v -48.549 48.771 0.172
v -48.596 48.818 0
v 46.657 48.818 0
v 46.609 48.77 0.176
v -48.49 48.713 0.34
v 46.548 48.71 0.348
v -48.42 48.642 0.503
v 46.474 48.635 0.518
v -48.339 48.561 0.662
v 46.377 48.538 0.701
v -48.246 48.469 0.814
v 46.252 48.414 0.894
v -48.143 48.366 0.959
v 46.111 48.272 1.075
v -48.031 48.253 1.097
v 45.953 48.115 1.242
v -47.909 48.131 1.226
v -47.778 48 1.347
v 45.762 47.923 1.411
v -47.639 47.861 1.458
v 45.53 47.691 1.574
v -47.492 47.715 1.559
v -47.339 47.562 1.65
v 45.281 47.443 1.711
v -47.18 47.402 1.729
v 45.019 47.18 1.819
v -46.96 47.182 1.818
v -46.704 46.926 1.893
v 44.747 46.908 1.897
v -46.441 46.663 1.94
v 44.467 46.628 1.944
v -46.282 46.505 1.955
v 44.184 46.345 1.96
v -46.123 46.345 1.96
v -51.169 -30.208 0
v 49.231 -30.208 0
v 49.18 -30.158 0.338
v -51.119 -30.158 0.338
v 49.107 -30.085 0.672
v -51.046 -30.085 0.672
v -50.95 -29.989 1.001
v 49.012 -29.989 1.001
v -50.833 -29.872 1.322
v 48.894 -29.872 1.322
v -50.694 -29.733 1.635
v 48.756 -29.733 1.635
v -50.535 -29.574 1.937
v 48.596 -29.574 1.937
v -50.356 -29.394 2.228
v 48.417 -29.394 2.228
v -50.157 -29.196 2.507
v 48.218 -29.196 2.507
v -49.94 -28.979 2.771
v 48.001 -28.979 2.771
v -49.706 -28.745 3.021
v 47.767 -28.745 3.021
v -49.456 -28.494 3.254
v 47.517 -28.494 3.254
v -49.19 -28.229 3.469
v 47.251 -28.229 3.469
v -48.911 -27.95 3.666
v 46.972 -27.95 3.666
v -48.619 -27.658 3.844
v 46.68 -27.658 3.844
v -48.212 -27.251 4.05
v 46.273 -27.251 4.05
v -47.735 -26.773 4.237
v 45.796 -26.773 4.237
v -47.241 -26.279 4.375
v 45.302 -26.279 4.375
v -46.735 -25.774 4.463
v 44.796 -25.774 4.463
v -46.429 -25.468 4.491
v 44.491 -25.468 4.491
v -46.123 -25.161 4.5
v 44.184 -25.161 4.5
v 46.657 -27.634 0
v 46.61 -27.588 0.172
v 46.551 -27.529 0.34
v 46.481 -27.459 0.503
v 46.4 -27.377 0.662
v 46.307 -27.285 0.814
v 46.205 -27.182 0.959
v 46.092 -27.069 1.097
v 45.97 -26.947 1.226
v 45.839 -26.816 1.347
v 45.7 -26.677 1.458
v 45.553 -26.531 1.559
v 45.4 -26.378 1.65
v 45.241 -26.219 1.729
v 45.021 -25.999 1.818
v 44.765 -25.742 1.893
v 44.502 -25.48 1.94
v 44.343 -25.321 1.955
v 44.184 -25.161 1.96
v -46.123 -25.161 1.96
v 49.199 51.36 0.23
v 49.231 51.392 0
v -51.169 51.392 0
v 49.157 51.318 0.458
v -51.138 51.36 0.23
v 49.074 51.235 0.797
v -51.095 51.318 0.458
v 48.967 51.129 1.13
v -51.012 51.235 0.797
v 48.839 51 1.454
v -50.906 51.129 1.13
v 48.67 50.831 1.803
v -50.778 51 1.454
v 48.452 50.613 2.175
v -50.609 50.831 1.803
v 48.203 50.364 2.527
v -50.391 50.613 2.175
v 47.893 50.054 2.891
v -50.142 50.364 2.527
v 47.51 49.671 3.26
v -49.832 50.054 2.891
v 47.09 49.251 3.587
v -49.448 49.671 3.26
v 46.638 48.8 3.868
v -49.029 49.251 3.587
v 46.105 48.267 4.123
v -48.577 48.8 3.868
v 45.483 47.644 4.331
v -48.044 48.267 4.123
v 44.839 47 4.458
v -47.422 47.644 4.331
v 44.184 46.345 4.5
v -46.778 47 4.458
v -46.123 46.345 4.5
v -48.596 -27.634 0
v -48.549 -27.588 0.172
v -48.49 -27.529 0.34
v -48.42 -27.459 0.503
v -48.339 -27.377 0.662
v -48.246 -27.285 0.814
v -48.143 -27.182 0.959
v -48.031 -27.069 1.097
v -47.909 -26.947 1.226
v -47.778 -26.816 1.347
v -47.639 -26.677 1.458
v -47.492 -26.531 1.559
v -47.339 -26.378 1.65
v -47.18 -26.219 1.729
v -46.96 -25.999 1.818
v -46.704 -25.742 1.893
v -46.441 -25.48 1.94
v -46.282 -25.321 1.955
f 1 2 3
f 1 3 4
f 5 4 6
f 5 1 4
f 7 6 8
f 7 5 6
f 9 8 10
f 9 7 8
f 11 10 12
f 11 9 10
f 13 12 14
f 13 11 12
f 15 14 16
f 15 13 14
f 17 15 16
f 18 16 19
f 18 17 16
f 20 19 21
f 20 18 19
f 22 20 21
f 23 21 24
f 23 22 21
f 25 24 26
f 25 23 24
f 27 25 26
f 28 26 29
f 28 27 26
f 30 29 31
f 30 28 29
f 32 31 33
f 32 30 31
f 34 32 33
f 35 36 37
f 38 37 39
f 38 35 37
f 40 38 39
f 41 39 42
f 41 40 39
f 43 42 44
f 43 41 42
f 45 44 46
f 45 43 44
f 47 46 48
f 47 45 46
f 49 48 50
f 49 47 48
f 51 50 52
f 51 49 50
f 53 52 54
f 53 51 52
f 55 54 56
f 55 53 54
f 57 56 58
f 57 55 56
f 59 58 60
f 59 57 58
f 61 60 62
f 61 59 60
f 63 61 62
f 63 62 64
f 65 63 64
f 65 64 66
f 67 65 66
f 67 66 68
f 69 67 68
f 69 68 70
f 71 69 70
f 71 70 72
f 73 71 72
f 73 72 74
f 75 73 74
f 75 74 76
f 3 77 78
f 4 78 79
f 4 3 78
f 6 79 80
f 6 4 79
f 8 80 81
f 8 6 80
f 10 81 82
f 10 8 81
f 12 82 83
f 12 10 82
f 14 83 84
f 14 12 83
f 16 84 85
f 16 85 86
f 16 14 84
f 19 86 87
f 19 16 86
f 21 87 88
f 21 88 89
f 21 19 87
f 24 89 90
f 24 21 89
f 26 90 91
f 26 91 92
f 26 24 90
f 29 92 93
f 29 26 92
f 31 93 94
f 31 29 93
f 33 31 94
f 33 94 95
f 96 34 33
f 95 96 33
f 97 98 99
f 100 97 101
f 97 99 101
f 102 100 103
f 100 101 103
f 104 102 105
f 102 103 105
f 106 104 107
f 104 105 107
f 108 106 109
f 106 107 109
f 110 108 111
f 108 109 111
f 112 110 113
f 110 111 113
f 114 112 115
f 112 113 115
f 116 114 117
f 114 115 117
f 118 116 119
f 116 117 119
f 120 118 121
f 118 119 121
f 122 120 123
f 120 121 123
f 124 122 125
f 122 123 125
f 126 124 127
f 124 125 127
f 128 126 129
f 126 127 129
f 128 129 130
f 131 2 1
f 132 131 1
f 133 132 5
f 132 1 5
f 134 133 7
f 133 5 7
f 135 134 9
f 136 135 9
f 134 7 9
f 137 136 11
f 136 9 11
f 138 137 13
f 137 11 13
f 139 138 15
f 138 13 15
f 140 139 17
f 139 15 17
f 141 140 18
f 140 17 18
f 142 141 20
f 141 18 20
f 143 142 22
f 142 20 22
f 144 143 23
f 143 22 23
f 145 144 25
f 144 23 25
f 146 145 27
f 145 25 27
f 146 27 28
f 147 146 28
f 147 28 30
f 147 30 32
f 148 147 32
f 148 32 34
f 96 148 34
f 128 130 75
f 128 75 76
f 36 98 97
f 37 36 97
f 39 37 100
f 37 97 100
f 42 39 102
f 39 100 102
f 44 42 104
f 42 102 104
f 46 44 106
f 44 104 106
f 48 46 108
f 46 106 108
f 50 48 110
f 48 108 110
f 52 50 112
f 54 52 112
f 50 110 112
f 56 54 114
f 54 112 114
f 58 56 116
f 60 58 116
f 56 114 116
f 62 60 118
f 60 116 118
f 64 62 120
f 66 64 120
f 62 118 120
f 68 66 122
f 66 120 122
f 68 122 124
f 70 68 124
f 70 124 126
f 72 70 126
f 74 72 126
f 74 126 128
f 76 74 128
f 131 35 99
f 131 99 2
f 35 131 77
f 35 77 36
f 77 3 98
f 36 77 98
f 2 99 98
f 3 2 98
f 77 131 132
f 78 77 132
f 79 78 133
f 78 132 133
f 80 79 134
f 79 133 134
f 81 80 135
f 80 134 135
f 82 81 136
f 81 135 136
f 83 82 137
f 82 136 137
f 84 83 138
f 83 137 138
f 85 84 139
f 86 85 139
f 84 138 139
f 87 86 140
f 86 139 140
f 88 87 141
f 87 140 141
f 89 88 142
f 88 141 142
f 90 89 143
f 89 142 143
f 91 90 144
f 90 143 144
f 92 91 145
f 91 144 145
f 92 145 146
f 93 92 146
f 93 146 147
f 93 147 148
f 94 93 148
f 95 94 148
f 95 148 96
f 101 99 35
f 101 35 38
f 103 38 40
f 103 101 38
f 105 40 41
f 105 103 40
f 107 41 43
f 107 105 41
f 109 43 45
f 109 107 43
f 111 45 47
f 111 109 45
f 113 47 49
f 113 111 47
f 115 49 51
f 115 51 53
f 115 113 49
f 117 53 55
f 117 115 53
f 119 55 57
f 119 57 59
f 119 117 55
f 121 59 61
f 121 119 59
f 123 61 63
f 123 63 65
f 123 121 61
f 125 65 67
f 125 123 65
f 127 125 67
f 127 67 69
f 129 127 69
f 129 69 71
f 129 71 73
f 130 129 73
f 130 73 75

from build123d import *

# Parameters (mm, degrees)
F0_W        = 100.4
F0_H        = 81.6
F1_DEPTH    = 4.5
F2_T1_DEPTH = 125.6339057619
F2_T3_DEPTH = 106.8339057619
F3_T        = -2.54


# Not quite as in the source:
# - a fillet or chamfer that OpenCascade refuses, or shapes differently, is made with other operations: its cross-section is extruded or revolved along the edge and cut away or added


with BuildPart() as f1:
    # F0 (on Top) → F1 (new body)
    with BuildSketch(Plane.XY):
        with Locations((-0.9694248438, 10.5918823534)):
            Rectangle(F0_W, F0_H)
    extrude(amount=F1_DEPTH)

    # F2: fillet of radius 5.08 on 4 edges, made by hand

    # F2_s2 → F2_t1 (cut)
    with BuildSketch(Plane.YZ.offset(-63.7863777247)):
        with BuildLine():
            ThreePointArc((51.3918823534, 0), (49.7259295019, 3.2116223441), (46.345101201, 4.5))
            Line((46.345101201, 4.5), (51.3918823534, 4.5))
            Line((51.3918823534, 4.5), (51.3918823534, 0))
        make_face()
        with BuildLine():
            ThreePointArc((-30.2081176466, 0), (-28.5421647951, 3.2116223441), (-25.1613364942, 4.5))
            Line((-25.1613364942, 4.5), (-30.2081176466, 4.5))
            Line((-30.2081176466, 4.5), (-30.2081176466, 0))
        make_face()
    extrude(amount=F2_T1_DEPTH, mode=Mode.SUBTRACT)

    # F2_s4 → F2_t3 (cut)
    with BuildSketch(Plane.XZ.offset(-64.0088352343)):
        with BuildLine():
            ThreePointArc((-51.1694248438, 0), (-49.5034719923, 3.2116223441), (-46.1226436914, 4.5))
            Line((-46.1226436914, 4.5), (-51.1694248438, 4.5))
            Line((-51.1694248438, 4.5), (-51.1694248438, 0))
        make_face()
        with BuildLine():
            ThreePointArc((49.2305751562, 0), (47.5646223047, 3.2116223441), (44.1837940038, 4.5))
            Line((44.1837940038, 4.5), (49.2305751562, 4.5))
            Line((49.2305751562, 4.5), (49.2305751562, 0))
        make_face()
    extrude(amount=F2_T3_DEPTH, mode=Mode.SUBTRACT)

    # F3
    f3_openings = [f1.faces().sort_by_distance(p)[0] for p in [
        (-0.969425, 10.591882, 0),
    ]]
    offset(amount=F3_T, openings=f3_openings)


solid = f1.part
